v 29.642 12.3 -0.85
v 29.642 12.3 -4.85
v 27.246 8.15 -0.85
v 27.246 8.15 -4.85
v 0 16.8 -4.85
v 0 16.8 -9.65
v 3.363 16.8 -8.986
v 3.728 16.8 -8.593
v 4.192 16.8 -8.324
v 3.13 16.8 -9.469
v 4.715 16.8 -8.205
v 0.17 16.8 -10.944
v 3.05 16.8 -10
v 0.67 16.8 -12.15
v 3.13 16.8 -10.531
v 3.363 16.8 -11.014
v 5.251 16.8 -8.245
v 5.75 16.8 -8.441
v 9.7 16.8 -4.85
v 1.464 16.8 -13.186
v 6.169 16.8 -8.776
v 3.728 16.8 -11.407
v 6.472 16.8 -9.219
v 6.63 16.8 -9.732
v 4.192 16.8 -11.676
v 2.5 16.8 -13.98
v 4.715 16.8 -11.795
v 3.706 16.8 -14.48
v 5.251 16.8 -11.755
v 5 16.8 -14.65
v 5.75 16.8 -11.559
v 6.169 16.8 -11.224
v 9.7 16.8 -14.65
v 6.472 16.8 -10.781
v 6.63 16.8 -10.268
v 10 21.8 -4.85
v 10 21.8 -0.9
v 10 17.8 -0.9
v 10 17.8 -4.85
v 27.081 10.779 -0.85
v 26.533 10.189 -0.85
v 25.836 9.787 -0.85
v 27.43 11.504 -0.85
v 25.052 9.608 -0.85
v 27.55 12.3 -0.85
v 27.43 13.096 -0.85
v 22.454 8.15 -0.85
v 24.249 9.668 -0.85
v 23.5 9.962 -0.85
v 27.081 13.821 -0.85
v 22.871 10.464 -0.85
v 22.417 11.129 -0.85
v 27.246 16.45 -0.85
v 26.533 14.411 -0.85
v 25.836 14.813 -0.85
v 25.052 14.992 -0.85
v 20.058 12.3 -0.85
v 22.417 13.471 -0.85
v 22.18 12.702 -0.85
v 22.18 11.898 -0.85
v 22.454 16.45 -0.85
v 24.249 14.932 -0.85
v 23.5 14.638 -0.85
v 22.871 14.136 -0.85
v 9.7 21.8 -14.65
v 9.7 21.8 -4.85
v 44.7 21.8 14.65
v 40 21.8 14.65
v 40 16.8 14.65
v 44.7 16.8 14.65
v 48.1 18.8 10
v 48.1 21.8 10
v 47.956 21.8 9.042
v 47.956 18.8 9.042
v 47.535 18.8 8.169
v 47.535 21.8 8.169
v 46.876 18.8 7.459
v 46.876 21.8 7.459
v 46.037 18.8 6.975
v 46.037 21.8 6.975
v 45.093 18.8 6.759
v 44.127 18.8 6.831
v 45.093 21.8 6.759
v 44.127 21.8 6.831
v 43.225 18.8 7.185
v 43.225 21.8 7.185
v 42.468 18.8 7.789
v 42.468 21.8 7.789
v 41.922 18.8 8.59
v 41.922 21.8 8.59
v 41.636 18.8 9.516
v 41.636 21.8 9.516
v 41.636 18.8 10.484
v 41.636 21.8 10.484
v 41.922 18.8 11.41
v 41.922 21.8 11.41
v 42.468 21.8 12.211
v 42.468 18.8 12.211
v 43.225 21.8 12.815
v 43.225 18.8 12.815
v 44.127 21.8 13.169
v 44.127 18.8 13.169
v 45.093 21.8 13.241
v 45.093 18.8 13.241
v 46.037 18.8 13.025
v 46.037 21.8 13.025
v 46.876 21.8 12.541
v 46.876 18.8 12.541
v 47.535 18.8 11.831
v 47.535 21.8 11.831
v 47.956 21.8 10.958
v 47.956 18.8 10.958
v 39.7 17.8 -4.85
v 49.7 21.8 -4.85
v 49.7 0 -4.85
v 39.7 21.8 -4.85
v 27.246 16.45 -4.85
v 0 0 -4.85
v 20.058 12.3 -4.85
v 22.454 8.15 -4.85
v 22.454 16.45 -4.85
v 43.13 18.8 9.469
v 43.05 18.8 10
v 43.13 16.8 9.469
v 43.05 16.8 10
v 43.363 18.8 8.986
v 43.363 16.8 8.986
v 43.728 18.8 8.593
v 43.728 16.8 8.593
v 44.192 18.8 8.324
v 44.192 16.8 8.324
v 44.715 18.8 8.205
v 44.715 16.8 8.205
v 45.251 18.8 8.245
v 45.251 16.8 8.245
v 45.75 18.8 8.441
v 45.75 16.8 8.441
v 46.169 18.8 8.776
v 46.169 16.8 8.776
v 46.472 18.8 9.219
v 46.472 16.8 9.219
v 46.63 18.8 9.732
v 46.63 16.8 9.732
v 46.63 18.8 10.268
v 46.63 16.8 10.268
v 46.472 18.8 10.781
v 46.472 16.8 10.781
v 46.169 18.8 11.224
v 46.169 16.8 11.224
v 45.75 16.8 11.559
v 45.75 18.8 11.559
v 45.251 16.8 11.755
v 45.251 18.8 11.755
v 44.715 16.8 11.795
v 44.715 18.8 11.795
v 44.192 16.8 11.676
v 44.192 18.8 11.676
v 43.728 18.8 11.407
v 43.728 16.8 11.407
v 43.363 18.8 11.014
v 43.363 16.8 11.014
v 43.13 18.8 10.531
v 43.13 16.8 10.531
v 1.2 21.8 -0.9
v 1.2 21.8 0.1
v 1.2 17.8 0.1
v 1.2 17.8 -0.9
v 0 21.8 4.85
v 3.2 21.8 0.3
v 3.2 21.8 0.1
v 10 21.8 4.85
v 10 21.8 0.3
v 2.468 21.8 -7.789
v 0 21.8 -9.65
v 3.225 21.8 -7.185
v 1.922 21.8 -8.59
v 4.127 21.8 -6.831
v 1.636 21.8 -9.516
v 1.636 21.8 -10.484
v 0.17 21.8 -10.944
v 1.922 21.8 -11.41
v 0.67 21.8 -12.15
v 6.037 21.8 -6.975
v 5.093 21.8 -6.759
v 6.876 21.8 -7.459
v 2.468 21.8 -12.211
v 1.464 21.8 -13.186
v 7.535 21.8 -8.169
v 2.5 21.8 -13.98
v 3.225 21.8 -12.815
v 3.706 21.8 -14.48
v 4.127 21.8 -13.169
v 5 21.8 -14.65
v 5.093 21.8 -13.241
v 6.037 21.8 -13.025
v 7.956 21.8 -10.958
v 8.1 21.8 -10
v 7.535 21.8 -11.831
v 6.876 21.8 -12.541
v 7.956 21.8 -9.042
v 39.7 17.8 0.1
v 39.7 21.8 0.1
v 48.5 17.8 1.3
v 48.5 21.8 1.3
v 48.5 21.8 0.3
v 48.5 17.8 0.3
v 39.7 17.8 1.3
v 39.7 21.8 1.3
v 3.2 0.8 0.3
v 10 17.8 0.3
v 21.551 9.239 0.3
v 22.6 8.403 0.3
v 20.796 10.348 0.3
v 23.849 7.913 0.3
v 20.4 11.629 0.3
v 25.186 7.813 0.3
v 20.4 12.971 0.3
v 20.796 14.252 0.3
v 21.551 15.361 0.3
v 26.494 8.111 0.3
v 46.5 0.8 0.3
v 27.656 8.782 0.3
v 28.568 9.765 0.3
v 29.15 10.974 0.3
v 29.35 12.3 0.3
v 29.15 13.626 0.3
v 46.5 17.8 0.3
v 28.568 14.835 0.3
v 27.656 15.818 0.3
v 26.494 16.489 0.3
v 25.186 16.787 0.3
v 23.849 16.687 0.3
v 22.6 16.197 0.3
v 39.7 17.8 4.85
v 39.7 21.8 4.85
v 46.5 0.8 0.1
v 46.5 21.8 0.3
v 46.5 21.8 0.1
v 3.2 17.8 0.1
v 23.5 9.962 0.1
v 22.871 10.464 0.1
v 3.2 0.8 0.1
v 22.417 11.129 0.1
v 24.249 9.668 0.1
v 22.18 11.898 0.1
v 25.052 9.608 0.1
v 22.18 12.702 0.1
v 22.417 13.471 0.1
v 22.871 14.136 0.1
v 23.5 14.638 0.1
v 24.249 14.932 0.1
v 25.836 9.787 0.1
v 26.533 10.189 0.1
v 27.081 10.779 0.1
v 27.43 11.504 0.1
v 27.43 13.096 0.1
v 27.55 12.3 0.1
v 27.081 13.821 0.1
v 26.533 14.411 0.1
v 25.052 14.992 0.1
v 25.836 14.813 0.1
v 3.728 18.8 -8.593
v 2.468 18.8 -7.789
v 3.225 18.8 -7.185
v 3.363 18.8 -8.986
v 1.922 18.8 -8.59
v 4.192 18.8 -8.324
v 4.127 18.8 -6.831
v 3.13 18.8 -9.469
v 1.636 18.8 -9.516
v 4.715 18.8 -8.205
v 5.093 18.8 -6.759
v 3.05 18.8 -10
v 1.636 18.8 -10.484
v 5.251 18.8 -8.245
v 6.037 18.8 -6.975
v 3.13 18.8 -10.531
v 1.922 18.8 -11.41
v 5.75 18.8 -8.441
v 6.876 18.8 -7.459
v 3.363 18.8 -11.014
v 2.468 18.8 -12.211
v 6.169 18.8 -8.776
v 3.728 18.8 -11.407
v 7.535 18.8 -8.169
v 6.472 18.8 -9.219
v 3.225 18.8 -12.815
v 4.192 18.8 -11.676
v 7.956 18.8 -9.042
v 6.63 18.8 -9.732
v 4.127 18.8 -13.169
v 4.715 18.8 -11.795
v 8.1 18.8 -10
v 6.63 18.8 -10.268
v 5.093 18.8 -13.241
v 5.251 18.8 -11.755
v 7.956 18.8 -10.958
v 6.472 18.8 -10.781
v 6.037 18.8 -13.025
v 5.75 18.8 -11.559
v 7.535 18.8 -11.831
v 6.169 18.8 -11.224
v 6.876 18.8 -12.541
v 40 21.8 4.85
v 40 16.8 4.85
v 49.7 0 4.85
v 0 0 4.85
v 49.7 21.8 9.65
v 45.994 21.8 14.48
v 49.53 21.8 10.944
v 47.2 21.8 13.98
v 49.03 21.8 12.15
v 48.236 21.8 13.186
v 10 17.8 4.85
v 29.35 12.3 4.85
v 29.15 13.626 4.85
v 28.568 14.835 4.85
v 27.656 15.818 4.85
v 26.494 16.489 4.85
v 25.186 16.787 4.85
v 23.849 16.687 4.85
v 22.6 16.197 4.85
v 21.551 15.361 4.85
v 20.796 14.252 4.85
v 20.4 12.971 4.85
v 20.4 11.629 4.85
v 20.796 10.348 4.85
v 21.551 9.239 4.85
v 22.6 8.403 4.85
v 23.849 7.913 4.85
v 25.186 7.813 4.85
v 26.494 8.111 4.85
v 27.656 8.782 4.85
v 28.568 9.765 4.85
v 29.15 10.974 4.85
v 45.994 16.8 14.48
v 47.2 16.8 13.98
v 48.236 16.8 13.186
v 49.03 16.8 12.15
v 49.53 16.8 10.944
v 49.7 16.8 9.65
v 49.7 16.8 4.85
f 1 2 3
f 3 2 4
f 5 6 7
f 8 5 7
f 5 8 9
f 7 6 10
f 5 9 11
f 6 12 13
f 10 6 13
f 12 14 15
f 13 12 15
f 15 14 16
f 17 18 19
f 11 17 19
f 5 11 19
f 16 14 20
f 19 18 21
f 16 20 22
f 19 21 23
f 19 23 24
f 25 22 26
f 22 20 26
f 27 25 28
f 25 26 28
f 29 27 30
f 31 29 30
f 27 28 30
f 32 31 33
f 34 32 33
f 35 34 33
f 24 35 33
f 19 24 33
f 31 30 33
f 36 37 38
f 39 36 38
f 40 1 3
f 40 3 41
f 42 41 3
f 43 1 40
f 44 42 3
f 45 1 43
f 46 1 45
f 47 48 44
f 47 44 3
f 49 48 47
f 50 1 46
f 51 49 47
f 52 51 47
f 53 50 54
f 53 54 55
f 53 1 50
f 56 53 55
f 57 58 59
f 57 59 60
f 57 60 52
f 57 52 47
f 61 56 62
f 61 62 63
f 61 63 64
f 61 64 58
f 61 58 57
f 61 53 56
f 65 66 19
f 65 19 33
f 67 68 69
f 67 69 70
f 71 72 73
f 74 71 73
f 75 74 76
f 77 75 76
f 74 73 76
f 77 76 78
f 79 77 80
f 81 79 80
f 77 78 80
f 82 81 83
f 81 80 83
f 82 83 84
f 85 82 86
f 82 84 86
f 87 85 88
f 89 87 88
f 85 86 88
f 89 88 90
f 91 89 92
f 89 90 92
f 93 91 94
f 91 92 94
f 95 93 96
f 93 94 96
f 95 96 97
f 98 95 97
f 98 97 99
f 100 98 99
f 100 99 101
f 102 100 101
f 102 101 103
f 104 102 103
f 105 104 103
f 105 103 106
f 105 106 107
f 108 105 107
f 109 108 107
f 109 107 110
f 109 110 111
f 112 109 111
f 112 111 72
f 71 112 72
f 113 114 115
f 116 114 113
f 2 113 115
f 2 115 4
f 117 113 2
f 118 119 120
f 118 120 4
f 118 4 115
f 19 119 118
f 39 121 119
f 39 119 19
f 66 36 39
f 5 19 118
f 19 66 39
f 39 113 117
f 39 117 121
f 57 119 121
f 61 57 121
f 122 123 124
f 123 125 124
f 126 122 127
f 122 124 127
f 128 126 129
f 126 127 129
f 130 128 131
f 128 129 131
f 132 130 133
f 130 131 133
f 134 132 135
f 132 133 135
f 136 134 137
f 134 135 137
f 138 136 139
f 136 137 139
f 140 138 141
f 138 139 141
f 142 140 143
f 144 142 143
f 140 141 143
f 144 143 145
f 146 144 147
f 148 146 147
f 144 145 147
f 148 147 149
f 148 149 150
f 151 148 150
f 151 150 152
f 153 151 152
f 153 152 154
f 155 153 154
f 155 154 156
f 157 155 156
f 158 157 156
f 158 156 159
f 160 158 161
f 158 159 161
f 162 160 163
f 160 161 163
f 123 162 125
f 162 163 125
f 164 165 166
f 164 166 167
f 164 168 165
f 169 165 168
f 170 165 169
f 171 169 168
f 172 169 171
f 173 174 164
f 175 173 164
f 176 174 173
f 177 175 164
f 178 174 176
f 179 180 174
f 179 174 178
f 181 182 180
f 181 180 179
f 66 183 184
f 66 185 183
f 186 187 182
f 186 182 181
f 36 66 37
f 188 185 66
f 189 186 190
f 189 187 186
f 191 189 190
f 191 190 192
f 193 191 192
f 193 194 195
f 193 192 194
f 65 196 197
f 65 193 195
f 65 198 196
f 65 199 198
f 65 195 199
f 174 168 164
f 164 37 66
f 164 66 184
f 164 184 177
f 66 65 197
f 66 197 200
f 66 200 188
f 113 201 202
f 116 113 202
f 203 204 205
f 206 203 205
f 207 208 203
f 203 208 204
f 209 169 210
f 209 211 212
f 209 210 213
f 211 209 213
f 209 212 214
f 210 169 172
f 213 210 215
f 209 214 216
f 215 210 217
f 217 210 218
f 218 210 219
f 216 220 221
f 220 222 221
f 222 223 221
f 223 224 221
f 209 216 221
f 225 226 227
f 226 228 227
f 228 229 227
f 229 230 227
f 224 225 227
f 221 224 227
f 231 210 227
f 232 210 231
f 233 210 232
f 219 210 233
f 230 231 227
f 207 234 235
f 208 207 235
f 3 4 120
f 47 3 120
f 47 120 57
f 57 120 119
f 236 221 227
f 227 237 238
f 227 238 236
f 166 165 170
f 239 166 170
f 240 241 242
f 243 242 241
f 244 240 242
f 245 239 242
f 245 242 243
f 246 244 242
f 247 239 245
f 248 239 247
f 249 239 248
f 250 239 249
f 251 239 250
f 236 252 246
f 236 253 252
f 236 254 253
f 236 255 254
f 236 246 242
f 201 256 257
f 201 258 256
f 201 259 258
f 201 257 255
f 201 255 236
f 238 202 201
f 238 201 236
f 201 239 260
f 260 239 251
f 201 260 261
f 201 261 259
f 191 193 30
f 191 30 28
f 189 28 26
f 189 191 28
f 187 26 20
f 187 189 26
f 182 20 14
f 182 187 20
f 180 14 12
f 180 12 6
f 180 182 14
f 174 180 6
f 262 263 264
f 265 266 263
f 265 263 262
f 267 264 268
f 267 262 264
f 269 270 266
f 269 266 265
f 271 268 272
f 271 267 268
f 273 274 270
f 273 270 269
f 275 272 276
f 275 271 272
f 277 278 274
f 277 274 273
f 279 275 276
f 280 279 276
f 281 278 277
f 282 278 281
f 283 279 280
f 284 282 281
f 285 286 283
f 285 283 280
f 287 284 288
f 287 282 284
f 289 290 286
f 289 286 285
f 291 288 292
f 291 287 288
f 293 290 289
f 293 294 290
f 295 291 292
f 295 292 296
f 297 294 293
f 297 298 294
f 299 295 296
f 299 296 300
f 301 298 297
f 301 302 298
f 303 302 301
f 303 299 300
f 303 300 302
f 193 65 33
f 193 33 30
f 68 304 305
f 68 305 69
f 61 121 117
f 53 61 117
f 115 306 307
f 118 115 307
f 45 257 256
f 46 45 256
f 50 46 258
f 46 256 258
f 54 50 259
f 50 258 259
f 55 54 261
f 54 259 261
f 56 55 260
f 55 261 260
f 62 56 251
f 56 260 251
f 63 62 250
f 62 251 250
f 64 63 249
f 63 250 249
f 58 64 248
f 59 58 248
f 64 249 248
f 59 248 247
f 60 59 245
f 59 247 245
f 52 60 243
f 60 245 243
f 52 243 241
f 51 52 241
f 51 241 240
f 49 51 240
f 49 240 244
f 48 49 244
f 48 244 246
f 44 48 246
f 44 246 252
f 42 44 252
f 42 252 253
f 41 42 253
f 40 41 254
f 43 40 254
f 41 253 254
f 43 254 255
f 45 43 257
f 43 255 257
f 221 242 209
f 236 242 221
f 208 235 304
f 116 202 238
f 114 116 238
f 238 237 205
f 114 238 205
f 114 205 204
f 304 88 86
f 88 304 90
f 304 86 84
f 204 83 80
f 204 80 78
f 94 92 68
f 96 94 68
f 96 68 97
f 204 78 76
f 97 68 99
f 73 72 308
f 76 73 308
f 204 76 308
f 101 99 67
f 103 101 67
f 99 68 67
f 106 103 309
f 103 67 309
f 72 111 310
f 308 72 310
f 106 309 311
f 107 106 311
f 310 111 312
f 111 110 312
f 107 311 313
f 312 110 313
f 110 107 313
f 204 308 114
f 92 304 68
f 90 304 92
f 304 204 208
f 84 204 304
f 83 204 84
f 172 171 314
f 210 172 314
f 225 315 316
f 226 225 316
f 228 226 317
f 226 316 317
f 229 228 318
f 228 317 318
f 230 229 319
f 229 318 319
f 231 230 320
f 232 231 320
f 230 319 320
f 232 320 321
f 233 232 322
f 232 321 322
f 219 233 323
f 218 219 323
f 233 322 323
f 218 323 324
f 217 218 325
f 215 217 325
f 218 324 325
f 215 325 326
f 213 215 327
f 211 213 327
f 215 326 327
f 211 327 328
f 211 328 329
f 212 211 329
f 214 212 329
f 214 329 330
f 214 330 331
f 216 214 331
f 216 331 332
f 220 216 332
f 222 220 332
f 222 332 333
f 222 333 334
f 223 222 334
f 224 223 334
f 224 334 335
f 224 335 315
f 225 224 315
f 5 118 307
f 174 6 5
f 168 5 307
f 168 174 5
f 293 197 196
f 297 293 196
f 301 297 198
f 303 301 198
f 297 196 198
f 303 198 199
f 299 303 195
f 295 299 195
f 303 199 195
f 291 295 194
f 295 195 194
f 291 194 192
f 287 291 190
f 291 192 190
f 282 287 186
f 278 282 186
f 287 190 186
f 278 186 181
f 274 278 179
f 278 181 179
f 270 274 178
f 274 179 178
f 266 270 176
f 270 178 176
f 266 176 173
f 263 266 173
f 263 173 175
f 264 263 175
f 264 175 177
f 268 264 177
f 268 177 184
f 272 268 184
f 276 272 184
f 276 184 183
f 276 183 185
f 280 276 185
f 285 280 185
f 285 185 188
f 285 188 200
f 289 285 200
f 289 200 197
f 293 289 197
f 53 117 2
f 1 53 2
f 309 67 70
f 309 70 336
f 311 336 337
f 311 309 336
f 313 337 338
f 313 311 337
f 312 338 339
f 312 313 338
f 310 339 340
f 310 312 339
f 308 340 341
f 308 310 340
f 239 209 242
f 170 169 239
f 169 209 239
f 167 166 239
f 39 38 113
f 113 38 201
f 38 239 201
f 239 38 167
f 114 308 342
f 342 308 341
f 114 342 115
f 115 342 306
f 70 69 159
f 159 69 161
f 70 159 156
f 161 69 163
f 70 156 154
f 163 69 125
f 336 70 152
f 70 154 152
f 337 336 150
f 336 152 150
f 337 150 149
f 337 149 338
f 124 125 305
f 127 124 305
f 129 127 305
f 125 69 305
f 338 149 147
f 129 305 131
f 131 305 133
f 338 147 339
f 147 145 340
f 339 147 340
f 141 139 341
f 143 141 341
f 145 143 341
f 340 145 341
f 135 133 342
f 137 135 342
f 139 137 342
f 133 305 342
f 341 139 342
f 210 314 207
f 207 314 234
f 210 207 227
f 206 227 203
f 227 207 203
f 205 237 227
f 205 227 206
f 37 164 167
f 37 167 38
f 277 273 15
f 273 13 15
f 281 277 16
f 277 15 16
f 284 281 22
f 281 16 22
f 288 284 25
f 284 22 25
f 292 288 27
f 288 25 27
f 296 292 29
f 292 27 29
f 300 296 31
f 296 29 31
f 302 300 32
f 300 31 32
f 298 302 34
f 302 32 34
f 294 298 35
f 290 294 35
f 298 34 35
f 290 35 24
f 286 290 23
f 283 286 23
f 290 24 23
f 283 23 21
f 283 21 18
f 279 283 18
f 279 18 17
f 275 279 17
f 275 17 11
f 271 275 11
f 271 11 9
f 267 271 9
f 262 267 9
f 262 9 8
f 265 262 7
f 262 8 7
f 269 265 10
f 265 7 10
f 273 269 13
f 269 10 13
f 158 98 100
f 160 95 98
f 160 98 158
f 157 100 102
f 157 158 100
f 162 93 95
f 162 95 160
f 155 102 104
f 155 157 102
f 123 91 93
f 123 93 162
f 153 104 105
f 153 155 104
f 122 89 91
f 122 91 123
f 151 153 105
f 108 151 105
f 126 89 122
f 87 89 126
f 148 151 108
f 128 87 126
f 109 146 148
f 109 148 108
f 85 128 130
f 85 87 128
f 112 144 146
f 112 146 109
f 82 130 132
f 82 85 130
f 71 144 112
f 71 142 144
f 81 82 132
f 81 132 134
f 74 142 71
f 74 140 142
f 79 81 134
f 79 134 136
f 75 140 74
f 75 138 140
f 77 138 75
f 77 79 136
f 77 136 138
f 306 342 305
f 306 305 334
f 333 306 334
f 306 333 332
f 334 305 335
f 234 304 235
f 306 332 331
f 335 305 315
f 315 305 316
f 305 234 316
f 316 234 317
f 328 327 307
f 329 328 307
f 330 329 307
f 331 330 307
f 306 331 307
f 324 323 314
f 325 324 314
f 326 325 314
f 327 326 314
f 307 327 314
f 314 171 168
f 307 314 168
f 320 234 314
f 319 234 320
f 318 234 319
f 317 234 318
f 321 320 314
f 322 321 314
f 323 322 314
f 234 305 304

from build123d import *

# Parameters (mm, degrees)
BOSS_EXTRUDE1_DEPTH            = 4.85
SKETCH2_W                      = 43.3
SKETCH2_H                      = 0.2
CUT_EXTRUDE1_DEPTH             = 21
BOSS_EXTRUDE2_DEPTH            = 5
CBORE_FOR_M3_SHCS1_D           = 3.6
CBORE_FOR_M3_SHCS1_CBORE_D     = 6.5
CBORE_FOR_M3_SHCS1_CBORE_DEPTH = 3
CUT_EXTRUDE2_DEPTH             = 4
CUT_EXTRUDE3_REACH             = 59.668
SKETCH9_R                      = 4.5
SKETCH10_W                     = 8.8
SKETCH10_H                     = 1
CUT_EXTRUDE4_DEPTH             = 4
SKETCH11_R                     = 2.7
CUT_EXTRUDE5_DEPTH             = 0.95


with BuildPart() as part:
    # Sketch1 → Boss-Extrude1 (new, symmetric)
    with BuildSketch(Plane.XY):
        Polygon((0, 0), (0, 21.8), (10, 21.8), (10, 17.8), (39.7, 17.8), (39.7, 21.8), (49.7, 21.8), (49.7, 0), align=None)
    extrude(amount=BOSS_EXTRUDE1_DEPTH, both=True)

    # Sketch2 → Cut-Extrude1 (cut)
    with BuildSketch(Plane(origin=(0, 21.8, 0), x_dir=(1, 0, 0), z_dir=(0, 1, 0))):
        with Locations((24.85, -0.2)):
            Rectangle(SKETCH2_W, SKETCH2_H)
    extrude(amount=-CUT_EXTRUDE1_DEPTH, mode=Mode.SUBTRACT)

    # Sketch3 → Boss-Extrude2 (add)
    with BuildSketch(Plane(origin=(0, 21.8, 0), x_dir=(1, 0, 0), z_dir=(0, 1, 0))):
        with BuildLine():
            Line((0, 9.65), (0, 4.85))
            Line((0, 4.85), (9.7, 4.85))
            Line((9.7, 4.85), (9.7, 14.65))
            Line((9.7, 14.65), (5, 14.65))
            ThreePointArc((5, 14.65), (1.464466094, 13.185533906), (0, 9.65))
        make_face()
        with BuildLine():
            Line((49.7, -4.85), (40, -4.85))
            Line((40, -4.85), (40, -14.65))
            Line((40, -14.65), (44.7, -14.65))
            ThreePointArc((44.7, -14.65), (48.235533906, -13.185533906), (49.7, -9.65))
            Line((49.7, -9.65), (49.7, -4.85))
        make_face()
    extrude(amount=-BOSS_EXTRUDE2_DEPTH)

    # CBORE for M3 SHCS1 (through all)
    with Locations(Plane(origin=(0, 21.8, 0), x_dir=(1, 0, 0), z_dir=(0, 1, 0))):
        with Locations((44.85, -10), (4.85, 10)):
            CounterBoreHole(CBORE_FOR_M3_SHCS1_D / 2, CBORE_FOR_M3_SHCS1_CBORE_D / 2, CBORE_FOR_M3_SHCS1_CBORE_DEPTH)

    # Sketch7 → Cut-Extrude2 (cut)
    with BuildSketch(Plane(origin=(0, 0, -4.85), x_dir=(-1, 0, 0), z_dir=(0, 0, -1))):
        Polygon((-29.642007234, 12.3), (-27.246003617, 8.15), (-22.453996383, 8.15), (-20.057992766, 12.3), (-22.453996383, 16.45), (-27.246003617, 16.45), align=None)
    extrude(amount=-CUT_EXTRUDE2_DEPTH, mode=Mode.SUBTRACT)

    # Sketch9 → Cut-Extrude3 (cut, up to next)
    with BuildSketch(Plane.XY.offset(4.85), mode=Mode.PRIVATE) as cut_extrude3_sk1:
        with Locations((24.85, 12.3)):
            Circle(SKETCH9_R)
    cut_extrude3_tool1 = extrude(cut_extrude3_sk1.sketch, amount=-CUT_EXTRUDE3_REACH, mode=Mode.PRIVATE) & part.part
    add(cut_extrude3_tool1.solids().sort_by_distance((24.85, 12.3, 4.85))[0], mode=Mode.SUBTRACT)

    # Sketch10 → Cut-Extrude4 (cut)
    with BuildSketch(Plane(origin=(0, 21.8, 0), x_dir=(1, 0, 0), z_dir=(0, 1, 0))):
        with Locations((5.6, 0.4)):
            Rectangle(SKETCH10_W, SKETCH10_H)
        with Locations((44.1, -0.8)):
            Rectangle(SKETCH10_W, SKETCH10_H)
    extrude(amount=-CUT_EXTRUDE4_DEPTH, mode=Mode.SUBTRACT)

    # Sketch11 → Cut-Extrude5 (cut)
    with BuildSketch(Plane.XY.offset(0.1)):
        with Locations((24.85, 12.3)):
            Circle(SKETCH11_R)
    extrude(amount=-CUT_EXTRUDE5_DEPTH, mode=Mode.SUBTRACT)


solid = part.part
